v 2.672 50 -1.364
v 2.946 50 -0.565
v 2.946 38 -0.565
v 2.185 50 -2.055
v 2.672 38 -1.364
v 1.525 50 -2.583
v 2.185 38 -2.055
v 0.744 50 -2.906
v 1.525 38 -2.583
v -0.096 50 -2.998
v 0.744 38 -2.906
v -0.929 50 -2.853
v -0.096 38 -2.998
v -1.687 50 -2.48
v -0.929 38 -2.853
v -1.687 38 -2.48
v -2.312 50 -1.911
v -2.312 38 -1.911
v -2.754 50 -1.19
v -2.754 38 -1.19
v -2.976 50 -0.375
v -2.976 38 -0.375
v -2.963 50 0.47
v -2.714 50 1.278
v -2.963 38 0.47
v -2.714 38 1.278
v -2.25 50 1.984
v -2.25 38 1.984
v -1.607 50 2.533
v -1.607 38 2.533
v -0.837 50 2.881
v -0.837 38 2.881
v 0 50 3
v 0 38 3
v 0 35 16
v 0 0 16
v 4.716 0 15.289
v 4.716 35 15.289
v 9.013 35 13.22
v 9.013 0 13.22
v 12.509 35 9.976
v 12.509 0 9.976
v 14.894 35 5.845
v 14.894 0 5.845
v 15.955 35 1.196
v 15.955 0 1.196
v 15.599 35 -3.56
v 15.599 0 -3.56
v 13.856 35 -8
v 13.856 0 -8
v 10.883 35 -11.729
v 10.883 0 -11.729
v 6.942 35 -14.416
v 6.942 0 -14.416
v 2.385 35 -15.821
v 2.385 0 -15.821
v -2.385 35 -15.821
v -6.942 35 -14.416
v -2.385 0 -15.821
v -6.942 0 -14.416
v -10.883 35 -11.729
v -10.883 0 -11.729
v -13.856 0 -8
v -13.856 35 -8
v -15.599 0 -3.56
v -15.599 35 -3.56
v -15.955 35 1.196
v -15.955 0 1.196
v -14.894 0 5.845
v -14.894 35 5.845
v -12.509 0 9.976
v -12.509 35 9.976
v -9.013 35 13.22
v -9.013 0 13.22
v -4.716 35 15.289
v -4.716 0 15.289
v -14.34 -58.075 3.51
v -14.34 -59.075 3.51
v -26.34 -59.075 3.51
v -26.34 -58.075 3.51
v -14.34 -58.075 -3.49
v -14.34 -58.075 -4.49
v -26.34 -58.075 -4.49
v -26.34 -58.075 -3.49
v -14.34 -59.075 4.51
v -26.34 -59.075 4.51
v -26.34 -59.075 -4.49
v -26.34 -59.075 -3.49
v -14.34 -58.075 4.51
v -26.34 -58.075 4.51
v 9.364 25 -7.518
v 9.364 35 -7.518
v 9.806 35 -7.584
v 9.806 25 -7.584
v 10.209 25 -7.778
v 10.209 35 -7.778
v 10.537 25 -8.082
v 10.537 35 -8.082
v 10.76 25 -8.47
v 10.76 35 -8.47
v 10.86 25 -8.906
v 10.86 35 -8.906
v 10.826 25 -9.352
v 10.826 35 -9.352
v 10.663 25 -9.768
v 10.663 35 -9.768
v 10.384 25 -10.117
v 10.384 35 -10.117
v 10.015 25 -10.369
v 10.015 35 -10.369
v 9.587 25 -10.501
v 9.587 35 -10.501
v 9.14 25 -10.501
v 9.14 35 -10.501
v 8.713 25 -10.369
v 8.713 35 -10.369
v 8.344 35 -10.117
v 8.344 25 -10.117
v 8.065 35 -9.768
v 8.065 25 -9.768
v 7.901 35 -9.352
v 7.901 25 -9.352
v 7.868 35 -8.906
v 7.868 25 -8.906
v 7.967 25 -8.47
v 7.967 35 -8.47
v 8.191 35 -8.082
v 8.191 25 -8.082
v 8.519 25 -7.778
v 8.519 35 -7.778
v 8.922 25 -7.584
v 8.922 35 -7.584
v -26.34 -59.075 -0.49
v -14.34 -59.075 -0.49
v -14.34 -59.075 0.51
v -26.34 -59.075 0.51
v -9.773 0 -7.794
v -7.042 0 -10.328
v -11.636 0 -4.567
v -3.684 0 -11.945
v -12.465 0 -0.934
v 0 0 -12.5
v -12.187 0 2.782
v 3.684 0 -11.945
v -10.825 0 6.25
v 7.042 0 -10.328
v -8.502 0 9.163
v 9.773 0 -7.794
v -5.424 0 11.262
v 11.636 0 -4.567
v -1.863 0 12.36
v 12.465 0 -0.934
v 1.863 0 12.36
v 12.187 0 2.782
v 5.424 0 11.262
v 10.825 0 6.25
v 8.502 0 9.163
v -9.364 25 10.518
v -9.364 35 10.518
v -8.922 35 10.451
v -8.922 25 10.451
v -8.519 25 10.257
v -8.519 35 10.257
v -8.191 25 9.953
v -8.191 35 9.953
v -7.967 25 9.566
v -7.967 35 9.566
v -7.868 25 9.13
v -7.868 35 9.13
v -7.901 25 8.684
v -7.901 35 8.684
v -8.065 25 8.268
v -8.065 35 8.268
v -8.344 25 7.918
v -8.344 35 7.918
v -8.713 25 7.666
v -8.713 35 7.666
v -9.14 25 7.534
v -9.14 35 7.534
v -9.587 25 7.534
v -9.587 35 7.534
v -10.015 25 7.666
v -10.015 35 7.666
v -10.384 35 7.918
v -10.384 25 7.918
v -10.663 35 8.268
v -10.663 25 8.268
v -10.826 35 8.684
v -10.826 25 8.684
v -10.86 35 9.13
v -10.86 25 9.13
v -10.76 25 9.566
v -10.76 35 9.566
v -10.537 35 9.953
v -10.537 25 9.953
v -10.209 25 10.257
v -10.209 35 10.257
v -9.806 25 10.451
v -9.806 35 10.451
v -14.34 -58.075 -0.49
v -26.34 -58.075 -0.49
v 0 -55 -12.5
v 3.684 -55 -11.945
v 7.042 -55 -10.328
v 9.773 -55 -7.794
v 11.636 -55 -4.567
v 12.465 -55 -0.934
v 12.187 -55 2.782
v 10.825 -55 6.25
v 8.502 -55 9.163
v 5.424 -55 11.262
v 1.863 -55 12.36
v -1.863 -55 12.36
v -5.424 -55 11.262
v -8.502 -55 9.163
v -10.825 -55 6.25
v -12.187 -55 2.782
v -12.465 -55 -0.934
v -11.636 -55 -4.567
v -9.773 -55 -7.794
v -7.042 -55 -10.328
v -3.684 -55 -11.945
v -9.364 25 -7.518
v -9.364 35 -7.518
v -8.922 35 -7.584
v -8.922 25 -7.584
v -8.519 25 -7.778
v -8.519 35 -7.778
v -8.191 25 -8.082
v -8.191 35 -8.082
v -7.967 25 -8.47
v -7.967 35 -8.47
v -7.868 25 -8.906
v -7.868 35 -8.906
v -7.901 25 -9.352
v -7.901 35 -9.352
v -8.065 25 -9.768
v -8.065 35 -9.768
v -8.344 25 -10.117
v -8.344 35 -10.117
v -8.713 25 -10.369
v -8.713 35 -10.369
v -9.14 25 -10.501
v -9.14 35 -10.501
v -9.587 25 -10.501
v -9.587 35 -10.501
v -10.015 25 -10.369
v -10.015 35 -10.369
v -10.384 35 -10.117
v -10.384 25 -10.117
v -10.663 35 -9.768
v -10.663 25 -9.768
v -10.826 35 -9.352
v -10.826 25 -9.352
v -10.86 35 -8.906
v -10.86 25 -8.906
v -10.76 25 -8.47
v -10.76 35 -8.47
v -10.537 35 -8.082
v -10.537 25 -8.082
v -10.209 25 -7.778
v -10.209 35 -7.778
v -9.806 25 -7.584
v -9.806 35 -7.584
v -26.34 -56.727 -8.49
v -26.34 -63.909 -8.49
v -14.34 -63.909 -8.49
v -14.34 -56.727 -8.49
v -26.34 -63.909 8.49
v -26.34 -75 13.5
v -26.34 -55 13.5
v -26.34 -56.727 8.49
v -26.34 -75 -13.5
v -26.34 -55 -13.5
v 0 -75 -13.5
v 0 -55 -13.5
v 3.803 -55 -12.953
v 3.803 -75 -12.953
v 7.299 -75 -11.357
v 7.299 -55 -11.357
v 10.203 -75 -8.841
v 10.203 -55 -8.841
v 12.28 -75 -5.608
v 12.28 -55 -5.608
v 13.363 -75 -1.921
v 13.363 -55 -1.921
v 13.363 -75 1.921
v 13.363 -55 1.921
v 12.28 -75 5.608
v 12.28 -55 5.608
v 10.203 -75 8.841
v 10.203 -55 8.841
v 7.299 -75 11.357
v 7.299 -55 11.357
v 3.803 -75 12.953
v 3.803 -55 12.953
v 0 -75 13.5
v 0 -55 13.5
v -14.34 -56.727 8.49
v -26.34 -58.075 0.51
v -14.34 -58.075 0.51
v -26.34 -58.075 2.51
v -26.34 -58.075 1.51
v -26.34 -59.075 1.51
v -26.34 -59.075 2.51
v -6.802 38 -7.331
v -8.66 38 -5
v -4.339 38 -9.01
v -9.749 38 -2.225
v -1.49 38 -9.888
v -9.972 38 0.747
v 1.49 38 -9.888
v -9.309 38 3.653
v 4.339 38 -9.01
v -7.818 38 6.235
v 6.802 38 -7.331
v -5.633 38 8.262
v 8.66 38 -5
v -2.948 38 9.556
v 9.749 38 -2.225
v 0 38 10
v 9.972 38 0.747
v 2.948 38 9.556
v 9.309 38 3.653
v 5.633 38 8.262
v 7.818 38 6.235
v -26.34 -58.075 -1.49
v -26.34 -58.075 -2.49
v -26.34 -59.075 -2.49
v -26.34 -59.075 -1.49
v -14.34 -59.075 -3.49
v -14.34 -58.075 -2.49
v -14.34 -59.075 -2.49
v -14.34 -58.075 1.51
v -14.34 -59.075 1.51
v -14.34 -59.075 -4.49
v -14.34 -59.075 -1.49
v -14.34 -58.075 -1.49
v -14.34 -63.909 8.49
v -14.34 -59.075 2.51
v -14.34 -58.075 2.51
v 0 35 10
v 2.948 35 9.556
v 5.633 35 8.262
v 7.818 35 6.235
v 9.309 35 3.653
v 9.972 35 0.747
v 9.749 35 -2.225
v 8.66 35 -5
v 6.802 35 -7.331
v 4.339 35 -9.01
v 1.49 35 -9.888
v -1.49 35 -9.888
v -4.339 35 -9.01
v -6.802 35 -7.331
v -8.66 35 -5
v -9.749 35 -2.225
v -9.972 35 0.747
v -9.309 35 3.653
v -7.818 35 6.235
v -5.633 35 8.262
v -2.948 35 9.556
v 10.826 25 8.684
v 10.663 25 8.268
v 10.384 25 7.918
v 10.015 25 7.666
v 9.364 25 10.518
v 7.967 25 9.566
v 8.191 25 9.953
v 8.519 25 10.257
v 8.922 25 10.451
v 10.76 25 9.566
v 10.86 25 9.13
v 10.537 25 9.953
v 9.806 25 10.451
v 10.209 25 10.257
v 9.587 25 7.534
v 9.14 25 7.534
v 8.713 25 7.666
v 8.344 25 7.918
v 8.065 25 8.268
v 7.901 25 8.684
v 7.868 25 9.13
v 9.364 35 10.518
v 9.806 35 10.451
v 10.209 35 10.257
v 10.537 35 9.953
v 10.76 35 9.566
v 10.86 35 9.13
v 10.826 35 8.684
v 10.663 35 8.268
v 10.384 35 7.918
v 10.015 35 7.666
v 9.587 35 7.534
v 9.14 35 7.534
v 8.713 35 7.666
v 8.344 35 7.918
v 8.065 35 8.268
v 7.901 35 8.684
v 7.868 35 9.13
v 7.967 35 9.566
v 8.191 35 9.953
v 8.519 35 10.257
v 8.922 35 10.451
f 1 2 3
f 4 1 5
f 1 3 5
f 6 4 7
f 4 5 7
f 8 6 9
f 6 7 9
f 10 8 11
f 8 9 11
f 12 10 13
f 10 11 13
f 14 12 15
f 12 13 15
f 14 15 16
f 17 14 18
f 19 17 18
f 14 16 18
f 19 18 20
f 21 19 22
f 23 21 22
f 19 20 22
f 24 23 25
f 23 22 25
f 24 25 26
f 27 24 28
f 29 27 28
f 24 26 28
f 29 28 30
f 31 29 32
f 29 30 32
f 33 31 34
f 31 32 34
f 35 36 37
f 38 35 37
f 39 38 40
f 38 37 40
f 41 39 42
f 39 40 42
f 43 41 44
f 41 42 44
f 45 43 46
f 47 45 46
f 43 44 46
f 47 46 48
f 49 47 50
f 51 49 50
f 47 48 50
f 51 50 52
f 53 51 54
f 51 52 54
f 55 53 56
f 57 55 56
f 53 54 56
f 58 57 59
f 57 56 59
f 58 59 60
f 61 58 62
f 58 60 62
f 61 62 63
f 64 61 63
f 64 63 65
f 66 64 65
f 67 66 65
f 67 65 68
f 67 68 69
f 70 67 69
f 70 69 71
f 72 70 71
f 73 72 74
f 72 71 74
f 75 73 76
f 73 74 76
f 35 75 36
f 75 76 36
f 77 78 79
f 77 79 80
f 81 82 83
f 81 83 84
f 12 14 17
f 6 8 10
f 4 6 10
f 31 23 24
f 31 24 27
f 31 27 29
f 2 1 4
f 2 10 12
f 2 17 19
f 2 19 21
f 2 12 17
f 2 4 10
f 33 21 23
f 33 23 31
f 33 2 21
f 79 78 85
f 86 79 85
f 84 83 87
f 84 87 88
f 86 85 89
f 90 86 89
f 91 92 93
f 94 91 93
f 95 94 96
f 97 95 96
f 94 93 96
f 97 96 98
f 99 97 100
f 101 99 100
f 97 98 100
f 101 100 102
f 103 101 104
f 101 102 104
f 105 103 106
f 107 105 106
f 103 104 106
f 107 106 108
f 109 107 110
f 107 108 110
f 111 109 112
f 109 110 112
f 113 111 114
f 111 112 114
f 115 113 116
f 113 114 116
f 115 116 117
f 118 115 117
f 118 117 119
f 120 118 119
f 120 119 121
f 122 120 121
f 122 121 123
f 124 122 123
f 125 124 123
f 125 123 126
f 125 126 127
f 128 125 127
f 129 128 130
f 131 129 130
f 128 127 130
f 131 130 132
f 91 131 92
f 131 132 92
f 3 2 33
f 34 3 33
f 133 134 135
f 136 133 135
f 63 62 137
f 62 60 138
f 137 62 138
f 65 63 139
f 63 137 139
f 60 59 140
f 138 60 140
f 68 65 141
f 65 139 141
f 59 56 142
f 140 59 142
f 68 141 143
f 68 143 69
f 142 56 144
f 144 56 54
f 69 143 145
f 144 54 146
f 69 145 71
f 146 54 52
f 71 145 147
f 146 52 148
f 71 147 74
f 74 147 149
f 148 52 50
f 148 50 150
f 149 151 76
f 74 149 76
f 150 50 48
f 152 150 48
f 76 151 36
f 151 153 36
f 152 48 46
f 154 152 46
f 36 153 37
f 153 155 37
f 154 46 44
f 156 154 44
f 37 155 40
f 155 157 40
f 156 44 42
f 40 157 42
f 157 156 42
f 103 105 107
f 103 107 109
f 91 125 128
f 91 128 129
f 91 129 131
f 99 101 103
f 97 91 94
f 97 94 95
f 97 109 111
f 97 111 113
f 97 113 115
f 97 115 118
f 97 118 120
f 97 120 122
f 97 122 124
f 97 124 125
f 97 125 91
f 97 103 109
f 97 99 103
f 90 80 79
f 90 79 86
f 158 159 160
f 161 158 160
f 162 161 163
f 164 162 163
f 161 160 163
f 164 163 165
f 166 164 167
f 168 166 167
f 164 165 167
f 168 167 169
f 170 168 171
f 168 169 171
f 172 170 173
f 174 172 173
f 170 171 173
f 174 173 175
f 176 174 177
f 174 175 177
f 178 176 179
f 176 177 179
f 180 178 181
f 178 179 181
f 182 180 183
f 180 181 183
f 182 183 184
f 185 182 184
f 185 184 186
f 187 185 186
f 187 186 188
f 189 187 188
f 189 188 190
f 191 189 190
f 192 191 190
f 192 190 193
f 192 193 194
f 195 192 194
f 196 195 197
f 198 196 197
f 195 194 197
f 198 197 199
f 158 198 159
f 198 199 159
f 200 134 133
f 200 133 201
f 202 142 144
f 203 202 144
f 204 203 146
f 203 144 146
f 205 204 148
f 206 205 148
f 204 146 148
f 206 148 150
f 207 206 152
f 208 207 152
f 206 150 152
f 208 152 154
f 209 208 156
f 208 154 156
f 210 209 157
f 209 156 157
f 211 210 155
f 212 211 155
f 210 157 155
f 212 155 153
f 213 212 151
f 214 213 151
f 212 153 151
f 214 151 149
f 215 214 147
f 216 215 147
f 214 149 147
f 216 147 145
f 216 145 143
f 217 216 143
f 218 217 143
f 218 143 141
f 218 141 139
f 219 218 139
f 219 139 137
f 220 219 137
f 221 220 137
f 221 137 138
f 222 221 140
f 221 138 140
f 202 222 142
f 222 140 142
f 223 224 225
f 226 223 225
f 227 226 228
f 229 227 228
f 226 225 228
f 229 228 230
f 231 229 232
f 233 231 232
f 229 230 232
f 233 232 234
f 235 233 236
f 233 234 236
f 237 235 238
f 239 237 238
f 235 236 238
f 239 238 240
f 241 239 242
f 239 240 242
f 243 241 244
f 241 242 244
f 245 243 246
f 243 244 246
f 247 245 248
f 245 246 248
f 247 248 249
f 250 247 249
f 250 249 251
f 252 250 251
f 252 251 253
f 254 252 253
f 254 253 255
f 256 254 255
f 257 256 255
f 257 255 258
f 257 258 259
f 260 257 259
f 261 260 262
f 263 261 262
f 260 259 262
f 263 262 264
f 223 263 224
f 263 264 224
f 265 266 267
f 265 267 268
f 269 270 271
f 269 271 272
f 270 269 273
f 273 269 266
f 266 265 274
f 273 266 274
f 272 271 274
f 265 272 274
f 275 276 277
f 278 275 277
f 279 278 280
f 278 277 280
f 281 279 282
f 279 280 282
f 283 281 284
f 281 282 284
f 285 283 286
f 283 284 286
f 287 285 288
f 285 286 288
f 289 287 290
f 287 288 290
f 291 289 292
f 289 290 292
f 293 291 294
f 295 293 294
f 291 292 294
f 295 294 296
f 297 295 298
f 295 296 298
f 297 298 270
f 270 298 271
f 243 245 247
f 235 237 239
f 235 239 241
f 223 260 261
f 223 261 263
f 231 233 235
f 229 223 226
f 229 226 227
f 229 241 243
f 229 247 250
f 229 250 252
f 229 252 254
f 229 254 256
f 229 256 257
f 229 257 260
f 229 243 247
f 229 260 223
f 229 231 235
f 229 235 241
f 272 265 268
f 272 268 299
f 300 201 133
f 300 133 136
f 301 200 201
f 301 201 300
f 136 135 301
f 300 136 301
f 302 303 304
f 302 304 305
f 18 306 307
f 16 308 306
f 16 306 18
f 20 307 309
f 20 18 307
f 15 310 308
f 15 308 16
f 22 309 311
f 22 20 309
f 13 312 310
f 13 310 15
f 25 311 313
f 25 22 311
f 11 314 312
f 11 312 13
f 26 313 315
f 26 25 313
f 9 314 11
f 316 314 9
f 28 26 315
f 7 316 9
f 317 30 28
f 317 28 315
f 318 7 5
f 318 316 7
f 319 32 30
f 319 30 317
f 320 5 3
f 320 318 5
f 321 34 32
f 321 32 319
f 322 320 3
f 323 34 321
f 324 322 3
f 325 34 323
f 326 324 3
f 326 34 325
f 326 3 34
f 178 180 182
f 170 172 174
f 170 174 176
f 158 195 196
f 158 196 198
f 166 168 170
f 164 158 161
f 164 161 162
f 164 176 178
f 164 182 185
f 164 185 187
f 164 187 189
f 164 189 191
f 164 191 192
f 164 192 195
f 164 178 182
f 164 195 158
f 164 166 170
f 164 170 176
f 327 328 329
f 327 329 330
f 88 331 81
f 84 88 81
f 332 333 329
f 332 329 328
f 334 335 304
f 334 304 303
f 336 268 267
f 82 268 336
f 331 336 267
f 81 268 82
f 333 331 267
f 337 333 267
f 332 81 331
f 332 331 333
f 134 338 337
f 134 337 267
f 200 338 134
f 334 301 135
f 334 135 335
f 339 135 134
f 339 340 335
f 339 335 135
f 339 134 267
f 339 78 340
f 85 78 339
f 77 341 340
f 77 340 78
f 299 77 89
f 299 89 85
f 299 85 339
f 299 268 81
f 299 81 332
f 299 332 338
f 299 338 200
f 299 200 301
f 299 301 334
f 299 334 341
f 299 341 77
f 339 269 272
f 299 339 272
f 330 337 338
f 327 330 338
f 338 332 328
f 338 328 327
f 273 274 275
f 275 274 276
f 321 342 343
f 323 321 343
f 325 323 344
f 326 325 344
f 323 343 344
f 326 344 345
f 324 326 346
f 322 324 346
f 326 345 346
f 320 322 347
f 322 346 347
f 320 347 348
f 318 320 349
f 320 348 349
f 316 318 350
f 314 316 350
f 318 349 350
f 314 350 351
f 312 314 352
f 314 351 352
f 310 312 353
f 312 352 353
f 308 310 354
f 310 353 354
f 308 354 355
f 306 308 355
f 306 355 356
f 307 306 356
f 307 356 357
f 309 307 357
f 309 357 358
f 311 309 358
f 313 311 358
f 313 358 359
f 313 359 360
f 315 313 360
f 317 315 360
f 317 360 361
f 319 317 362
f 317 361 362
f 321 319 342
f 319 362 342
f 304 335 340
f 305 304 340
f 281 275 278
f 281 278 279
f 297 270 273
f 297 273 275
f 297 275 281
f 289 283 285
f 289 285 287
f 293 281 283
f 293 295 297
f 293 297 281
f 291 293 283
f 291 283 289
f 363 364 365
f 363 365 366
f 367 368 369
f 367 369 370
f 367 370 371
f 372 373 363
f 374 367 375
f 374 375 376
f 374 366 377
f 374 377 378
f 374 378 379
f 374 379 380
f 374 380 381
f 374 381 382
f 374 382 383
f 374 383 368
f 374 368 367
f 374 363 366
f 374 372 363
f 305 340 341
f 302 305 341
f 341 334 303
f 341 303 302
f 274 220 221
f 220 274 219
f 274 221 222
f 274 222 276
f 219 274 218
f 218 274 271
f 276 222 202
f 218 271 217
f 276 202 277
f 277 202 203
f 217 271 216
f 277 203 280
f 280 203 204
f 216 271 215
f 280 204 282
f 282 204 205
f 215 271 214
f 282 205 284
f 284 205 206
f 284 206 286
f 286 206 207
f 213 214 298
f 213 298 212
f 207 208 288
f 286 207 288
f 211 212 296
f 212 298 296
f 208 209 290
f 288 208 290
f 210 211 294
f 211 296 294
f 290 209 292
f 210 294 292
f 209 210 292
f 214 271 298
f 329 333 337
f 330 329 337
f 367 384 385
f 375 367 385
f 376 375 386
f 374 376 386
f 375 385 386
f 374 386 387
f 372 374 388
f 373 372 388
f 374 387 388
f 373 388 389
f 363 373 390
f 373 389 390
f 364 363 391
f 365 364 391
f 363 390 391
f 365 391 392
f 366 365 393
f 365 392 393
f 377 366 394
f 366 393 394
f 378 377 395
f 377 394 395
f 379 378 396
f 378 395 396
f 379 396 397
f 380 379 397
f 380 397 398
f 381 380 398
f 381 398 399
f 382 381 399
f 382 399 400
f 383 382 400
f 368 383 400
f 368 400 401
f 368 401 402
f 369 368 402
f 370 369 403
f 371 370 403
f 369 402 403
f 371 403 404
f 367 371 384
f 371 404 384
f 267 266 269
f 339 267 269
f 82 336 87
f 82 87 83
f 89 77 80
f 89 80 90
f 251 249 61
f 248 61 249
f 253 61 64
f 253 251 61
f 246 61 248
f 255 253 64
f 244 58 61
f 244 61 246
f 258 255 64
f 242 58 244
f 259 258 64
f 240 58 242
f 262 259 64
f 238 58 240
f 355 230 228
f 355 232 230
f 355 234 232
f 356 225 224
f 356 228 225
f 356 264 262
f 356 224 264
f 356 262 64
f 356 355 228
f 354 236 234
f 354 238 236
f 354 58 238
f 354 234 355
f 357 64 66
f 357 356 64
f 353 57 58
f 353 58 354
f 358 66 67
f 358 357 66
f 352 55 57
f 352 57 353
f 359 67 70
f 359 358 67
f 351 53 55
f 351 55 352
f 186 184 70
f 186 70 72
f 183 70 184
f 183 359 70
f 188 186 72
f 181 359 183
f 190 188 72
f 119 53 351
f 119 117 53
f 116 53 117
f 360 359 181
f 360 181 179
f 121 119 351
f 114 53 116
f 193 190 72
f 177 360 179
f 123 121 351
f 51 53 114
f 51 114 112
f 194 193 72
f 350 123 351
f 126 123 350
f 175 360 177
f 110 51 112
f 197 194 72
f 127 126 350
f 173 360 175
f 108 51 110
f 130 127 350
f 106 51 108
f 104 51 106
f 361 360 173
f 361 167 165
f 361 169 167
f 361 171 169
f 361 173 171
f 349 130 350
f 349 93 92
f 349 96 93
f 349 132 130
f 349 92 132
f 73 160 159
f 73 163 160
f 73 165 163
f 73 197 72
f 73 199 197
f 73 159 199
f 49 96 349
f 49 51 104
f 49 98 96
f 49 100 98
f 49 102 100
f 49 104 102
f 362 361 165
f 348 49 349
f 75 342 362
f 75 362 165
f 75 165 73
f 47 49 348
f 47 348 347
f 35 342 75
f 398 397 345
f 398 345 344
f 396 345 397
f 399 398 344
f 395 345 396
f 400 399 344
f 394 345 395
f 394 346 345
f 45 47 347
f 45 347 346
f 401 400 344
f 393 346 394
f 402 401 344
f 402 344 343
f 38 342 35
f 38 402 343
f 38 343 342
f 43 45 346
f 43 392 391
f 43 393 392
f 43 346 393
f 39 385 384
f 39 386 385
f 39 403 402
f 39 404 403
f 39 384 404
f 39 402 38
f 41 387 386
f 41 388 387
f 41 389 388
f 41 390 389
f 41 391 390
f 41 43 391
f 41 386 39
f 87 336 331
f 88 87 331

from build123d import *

# Parameters (mm, degrees)
ESQUISSE1_R             = 16
BOSS_EXTRU_1_DEPTH      = 35
ESQUISSE2_R             = 12.5
BOSS_EXTRU_2_DEPTH      = 55
ESQUISSE3_R             = 3
BOSS_EXTRU_3_DEPTH      = 15
ENL_V_START             = -15
ENL_V_MAT_EXTRU_1_DEPTH = 15
ESQUISSE5_R             = 10
BOSS_EXTRU_4_DEPTH      = 3
ESQUISSE8_R             = 1.5
ENL_V_MAT_EXTRU_2_DEPTH = 10
BOSS_EXTRU_5_DEPTH      = 20
ESQUISSE10_W            = 16.98090883
ESQUISSE10_H            = 7.182585406
ENL_V_MAT_EXTRU_3_DEPTH = 12
ESQUISSE12_W            = 1
ESQUISSE12_H            = 1
BOSS_EXTRU_6_DEPTH      = 12


with BuildPart() as part:
    # Esquisse1 → Boss.-Extru.1 (new body)
    with BuildSketch(Plane(origin=(0, 0, 0), x_dir=(1, 0, 0), z_dir=(0, 1, 0))):
        with Locations(Location((0, 0, 0), (0, 0, 270))):
            Circle(ESQUISSE1_R)
    extrude(amount=BOSS_EXTRU_1_DEPTH)

    # Esquisse2 → Boss.-Extru.2 (add)
    with BuildSketch(Plane.XZ):
        with Locations(Location((0, 0, 0), (0, 0, 270))):
            Circle(ESQUISSE2_R)
    extrude(amount=BOSS_EXTRU_2_DEPTH)

    # Esquisse3 → Boss.-Extru.3 (add)
    with BuildSketch(Plane(origin=(0, 35, 0), x_dir=(1, 0, 0), z_dir=(0, 1, 0))):
        with Locations(Location((0, 0, 0), (0, 0, 270))):
            Circle(ESQUISSE3_R)
    extrude(amount=BOSS_EXTRU_3_DEPTH)

    # Esquisse4 → Enlèv. mat.-Extru.1 (cut)
    with BuildSketch(Plane(origin=(0, 50, 0), x_dir=(1, 0, 0), z_dir=(0, 1, 0)).offset(ENL_V_START)):
        with BuildLine():
            Line((2.946395849, 0.56458082), (0, -3))
            ThreePointArc((0, -3), (2.31233026, -1.911315979), (2.946395849, 0.56458082))
        make_face()
    extrude(amount=ENL_V_MAT_EXTRU_1_DEPTH, mode=Mode.SUBTRACT)

    # Esquisse5 → Boss.-Extru.4 (add)
    with BuildSketch(Plane(origin=(0, 35, 0), x_dir=(1, 0, 0), z_dir=(0, 1, 0))):
        with Locations(Location((0, 0, 0), (0, 0, 270))):
            Circle(ESQUISSE5_R)
    extrude(amount=BOSS_EXTRU_4_DEPTH)

    # Esquisse8 → Enlèv. mat.-Extru.2 (cut)
    with BuildSketch(Plane(origin=(0, 35, 0), x_dir=(1, 0, 0), z_dir=(0, 1, 0))):
        with Locations(Location((-9.363786072, 9.017733108, 0), (0, 0, 270))):
            Circle(ESQUISSE8_R)
        with Locations(Location((9.363786072, 9.017733108, 0), (0, 0, 270))):
            Circle(ESQUISSE8_R)
        with Locations(Location((-9.363786072, -9.017733108, 0), (0, 0, 270))):
            Circle(ESQUISSE8_R)
        with Locations(Location((9.363786072, -9.017733108, 0), (0, 0, 270))):
            Circle(ESQUISSE8_R)
    extrude(amount=-ENL_V_MAT_EXTRU_2_DEPTH, mode=Mode.SUBTRACT)

    # Esquisse9 → Boss.-Extru.5 (add)
    with BuildSketch(Plane.XZ.offset(55)):
        with BuildLine():
            Line((0, 13.5), (-26.340367248, 13.5))
            Line((-26.340367248, 13.5), (-26.340367248, -13.5))
            Line((-26.340367248, -13.5), (0, -13.5))
            ThreePointArc((0, -13.5), (13.5, 0), (0, 13.5))
        make_face()
    extrude(amount=BOSS_EXTRU_5_DEPTH)

    # Esquisse10 → Enlèv. mat.-Extru.3 (cut)
    with BuildSketch(Plane.ZY.offset(26.340367248)):
        with Locations((0, -60.318042099)):
            Rectangle(ESQUISSE10_W, ESQUISSE10_H)
    extrude(amount=-ENL_V_MAT_EXTRU_3_DEPTH, mode=Mode.SUBTRACT)

    # Esquisse12 → Boss.-Extru.6 (add)
    with BuildSketch(Plane.ZY.offset(14.340367248)):
        with Locations((-1.990454415, -58.574860414)):
            Rectangle(ESQUISSE12_W, ESQUISSE12_H)
        with Locations((-3.990454415, -58.574860414)):
            Rectangle(ESQUISSE12_W, ESQUISSE12_H)
        with Locations((0.009545585, -58.574860414)):
            Rectangle(ESQUISSE12_W, ESQUISSE12_H)
        with Locations((2.009545585, -58.574860414)):
            Rectangle(ESQUISSE12_W, ESQUISSE12_H)
        with Locations((4.009545585, -58.574860414)):
            Rectangle(ESQUISSE12_W, ESQUISSE12_H)
    extrude(amount=BOSS_EXTRU_6_DEPTH)


solid = part.part
